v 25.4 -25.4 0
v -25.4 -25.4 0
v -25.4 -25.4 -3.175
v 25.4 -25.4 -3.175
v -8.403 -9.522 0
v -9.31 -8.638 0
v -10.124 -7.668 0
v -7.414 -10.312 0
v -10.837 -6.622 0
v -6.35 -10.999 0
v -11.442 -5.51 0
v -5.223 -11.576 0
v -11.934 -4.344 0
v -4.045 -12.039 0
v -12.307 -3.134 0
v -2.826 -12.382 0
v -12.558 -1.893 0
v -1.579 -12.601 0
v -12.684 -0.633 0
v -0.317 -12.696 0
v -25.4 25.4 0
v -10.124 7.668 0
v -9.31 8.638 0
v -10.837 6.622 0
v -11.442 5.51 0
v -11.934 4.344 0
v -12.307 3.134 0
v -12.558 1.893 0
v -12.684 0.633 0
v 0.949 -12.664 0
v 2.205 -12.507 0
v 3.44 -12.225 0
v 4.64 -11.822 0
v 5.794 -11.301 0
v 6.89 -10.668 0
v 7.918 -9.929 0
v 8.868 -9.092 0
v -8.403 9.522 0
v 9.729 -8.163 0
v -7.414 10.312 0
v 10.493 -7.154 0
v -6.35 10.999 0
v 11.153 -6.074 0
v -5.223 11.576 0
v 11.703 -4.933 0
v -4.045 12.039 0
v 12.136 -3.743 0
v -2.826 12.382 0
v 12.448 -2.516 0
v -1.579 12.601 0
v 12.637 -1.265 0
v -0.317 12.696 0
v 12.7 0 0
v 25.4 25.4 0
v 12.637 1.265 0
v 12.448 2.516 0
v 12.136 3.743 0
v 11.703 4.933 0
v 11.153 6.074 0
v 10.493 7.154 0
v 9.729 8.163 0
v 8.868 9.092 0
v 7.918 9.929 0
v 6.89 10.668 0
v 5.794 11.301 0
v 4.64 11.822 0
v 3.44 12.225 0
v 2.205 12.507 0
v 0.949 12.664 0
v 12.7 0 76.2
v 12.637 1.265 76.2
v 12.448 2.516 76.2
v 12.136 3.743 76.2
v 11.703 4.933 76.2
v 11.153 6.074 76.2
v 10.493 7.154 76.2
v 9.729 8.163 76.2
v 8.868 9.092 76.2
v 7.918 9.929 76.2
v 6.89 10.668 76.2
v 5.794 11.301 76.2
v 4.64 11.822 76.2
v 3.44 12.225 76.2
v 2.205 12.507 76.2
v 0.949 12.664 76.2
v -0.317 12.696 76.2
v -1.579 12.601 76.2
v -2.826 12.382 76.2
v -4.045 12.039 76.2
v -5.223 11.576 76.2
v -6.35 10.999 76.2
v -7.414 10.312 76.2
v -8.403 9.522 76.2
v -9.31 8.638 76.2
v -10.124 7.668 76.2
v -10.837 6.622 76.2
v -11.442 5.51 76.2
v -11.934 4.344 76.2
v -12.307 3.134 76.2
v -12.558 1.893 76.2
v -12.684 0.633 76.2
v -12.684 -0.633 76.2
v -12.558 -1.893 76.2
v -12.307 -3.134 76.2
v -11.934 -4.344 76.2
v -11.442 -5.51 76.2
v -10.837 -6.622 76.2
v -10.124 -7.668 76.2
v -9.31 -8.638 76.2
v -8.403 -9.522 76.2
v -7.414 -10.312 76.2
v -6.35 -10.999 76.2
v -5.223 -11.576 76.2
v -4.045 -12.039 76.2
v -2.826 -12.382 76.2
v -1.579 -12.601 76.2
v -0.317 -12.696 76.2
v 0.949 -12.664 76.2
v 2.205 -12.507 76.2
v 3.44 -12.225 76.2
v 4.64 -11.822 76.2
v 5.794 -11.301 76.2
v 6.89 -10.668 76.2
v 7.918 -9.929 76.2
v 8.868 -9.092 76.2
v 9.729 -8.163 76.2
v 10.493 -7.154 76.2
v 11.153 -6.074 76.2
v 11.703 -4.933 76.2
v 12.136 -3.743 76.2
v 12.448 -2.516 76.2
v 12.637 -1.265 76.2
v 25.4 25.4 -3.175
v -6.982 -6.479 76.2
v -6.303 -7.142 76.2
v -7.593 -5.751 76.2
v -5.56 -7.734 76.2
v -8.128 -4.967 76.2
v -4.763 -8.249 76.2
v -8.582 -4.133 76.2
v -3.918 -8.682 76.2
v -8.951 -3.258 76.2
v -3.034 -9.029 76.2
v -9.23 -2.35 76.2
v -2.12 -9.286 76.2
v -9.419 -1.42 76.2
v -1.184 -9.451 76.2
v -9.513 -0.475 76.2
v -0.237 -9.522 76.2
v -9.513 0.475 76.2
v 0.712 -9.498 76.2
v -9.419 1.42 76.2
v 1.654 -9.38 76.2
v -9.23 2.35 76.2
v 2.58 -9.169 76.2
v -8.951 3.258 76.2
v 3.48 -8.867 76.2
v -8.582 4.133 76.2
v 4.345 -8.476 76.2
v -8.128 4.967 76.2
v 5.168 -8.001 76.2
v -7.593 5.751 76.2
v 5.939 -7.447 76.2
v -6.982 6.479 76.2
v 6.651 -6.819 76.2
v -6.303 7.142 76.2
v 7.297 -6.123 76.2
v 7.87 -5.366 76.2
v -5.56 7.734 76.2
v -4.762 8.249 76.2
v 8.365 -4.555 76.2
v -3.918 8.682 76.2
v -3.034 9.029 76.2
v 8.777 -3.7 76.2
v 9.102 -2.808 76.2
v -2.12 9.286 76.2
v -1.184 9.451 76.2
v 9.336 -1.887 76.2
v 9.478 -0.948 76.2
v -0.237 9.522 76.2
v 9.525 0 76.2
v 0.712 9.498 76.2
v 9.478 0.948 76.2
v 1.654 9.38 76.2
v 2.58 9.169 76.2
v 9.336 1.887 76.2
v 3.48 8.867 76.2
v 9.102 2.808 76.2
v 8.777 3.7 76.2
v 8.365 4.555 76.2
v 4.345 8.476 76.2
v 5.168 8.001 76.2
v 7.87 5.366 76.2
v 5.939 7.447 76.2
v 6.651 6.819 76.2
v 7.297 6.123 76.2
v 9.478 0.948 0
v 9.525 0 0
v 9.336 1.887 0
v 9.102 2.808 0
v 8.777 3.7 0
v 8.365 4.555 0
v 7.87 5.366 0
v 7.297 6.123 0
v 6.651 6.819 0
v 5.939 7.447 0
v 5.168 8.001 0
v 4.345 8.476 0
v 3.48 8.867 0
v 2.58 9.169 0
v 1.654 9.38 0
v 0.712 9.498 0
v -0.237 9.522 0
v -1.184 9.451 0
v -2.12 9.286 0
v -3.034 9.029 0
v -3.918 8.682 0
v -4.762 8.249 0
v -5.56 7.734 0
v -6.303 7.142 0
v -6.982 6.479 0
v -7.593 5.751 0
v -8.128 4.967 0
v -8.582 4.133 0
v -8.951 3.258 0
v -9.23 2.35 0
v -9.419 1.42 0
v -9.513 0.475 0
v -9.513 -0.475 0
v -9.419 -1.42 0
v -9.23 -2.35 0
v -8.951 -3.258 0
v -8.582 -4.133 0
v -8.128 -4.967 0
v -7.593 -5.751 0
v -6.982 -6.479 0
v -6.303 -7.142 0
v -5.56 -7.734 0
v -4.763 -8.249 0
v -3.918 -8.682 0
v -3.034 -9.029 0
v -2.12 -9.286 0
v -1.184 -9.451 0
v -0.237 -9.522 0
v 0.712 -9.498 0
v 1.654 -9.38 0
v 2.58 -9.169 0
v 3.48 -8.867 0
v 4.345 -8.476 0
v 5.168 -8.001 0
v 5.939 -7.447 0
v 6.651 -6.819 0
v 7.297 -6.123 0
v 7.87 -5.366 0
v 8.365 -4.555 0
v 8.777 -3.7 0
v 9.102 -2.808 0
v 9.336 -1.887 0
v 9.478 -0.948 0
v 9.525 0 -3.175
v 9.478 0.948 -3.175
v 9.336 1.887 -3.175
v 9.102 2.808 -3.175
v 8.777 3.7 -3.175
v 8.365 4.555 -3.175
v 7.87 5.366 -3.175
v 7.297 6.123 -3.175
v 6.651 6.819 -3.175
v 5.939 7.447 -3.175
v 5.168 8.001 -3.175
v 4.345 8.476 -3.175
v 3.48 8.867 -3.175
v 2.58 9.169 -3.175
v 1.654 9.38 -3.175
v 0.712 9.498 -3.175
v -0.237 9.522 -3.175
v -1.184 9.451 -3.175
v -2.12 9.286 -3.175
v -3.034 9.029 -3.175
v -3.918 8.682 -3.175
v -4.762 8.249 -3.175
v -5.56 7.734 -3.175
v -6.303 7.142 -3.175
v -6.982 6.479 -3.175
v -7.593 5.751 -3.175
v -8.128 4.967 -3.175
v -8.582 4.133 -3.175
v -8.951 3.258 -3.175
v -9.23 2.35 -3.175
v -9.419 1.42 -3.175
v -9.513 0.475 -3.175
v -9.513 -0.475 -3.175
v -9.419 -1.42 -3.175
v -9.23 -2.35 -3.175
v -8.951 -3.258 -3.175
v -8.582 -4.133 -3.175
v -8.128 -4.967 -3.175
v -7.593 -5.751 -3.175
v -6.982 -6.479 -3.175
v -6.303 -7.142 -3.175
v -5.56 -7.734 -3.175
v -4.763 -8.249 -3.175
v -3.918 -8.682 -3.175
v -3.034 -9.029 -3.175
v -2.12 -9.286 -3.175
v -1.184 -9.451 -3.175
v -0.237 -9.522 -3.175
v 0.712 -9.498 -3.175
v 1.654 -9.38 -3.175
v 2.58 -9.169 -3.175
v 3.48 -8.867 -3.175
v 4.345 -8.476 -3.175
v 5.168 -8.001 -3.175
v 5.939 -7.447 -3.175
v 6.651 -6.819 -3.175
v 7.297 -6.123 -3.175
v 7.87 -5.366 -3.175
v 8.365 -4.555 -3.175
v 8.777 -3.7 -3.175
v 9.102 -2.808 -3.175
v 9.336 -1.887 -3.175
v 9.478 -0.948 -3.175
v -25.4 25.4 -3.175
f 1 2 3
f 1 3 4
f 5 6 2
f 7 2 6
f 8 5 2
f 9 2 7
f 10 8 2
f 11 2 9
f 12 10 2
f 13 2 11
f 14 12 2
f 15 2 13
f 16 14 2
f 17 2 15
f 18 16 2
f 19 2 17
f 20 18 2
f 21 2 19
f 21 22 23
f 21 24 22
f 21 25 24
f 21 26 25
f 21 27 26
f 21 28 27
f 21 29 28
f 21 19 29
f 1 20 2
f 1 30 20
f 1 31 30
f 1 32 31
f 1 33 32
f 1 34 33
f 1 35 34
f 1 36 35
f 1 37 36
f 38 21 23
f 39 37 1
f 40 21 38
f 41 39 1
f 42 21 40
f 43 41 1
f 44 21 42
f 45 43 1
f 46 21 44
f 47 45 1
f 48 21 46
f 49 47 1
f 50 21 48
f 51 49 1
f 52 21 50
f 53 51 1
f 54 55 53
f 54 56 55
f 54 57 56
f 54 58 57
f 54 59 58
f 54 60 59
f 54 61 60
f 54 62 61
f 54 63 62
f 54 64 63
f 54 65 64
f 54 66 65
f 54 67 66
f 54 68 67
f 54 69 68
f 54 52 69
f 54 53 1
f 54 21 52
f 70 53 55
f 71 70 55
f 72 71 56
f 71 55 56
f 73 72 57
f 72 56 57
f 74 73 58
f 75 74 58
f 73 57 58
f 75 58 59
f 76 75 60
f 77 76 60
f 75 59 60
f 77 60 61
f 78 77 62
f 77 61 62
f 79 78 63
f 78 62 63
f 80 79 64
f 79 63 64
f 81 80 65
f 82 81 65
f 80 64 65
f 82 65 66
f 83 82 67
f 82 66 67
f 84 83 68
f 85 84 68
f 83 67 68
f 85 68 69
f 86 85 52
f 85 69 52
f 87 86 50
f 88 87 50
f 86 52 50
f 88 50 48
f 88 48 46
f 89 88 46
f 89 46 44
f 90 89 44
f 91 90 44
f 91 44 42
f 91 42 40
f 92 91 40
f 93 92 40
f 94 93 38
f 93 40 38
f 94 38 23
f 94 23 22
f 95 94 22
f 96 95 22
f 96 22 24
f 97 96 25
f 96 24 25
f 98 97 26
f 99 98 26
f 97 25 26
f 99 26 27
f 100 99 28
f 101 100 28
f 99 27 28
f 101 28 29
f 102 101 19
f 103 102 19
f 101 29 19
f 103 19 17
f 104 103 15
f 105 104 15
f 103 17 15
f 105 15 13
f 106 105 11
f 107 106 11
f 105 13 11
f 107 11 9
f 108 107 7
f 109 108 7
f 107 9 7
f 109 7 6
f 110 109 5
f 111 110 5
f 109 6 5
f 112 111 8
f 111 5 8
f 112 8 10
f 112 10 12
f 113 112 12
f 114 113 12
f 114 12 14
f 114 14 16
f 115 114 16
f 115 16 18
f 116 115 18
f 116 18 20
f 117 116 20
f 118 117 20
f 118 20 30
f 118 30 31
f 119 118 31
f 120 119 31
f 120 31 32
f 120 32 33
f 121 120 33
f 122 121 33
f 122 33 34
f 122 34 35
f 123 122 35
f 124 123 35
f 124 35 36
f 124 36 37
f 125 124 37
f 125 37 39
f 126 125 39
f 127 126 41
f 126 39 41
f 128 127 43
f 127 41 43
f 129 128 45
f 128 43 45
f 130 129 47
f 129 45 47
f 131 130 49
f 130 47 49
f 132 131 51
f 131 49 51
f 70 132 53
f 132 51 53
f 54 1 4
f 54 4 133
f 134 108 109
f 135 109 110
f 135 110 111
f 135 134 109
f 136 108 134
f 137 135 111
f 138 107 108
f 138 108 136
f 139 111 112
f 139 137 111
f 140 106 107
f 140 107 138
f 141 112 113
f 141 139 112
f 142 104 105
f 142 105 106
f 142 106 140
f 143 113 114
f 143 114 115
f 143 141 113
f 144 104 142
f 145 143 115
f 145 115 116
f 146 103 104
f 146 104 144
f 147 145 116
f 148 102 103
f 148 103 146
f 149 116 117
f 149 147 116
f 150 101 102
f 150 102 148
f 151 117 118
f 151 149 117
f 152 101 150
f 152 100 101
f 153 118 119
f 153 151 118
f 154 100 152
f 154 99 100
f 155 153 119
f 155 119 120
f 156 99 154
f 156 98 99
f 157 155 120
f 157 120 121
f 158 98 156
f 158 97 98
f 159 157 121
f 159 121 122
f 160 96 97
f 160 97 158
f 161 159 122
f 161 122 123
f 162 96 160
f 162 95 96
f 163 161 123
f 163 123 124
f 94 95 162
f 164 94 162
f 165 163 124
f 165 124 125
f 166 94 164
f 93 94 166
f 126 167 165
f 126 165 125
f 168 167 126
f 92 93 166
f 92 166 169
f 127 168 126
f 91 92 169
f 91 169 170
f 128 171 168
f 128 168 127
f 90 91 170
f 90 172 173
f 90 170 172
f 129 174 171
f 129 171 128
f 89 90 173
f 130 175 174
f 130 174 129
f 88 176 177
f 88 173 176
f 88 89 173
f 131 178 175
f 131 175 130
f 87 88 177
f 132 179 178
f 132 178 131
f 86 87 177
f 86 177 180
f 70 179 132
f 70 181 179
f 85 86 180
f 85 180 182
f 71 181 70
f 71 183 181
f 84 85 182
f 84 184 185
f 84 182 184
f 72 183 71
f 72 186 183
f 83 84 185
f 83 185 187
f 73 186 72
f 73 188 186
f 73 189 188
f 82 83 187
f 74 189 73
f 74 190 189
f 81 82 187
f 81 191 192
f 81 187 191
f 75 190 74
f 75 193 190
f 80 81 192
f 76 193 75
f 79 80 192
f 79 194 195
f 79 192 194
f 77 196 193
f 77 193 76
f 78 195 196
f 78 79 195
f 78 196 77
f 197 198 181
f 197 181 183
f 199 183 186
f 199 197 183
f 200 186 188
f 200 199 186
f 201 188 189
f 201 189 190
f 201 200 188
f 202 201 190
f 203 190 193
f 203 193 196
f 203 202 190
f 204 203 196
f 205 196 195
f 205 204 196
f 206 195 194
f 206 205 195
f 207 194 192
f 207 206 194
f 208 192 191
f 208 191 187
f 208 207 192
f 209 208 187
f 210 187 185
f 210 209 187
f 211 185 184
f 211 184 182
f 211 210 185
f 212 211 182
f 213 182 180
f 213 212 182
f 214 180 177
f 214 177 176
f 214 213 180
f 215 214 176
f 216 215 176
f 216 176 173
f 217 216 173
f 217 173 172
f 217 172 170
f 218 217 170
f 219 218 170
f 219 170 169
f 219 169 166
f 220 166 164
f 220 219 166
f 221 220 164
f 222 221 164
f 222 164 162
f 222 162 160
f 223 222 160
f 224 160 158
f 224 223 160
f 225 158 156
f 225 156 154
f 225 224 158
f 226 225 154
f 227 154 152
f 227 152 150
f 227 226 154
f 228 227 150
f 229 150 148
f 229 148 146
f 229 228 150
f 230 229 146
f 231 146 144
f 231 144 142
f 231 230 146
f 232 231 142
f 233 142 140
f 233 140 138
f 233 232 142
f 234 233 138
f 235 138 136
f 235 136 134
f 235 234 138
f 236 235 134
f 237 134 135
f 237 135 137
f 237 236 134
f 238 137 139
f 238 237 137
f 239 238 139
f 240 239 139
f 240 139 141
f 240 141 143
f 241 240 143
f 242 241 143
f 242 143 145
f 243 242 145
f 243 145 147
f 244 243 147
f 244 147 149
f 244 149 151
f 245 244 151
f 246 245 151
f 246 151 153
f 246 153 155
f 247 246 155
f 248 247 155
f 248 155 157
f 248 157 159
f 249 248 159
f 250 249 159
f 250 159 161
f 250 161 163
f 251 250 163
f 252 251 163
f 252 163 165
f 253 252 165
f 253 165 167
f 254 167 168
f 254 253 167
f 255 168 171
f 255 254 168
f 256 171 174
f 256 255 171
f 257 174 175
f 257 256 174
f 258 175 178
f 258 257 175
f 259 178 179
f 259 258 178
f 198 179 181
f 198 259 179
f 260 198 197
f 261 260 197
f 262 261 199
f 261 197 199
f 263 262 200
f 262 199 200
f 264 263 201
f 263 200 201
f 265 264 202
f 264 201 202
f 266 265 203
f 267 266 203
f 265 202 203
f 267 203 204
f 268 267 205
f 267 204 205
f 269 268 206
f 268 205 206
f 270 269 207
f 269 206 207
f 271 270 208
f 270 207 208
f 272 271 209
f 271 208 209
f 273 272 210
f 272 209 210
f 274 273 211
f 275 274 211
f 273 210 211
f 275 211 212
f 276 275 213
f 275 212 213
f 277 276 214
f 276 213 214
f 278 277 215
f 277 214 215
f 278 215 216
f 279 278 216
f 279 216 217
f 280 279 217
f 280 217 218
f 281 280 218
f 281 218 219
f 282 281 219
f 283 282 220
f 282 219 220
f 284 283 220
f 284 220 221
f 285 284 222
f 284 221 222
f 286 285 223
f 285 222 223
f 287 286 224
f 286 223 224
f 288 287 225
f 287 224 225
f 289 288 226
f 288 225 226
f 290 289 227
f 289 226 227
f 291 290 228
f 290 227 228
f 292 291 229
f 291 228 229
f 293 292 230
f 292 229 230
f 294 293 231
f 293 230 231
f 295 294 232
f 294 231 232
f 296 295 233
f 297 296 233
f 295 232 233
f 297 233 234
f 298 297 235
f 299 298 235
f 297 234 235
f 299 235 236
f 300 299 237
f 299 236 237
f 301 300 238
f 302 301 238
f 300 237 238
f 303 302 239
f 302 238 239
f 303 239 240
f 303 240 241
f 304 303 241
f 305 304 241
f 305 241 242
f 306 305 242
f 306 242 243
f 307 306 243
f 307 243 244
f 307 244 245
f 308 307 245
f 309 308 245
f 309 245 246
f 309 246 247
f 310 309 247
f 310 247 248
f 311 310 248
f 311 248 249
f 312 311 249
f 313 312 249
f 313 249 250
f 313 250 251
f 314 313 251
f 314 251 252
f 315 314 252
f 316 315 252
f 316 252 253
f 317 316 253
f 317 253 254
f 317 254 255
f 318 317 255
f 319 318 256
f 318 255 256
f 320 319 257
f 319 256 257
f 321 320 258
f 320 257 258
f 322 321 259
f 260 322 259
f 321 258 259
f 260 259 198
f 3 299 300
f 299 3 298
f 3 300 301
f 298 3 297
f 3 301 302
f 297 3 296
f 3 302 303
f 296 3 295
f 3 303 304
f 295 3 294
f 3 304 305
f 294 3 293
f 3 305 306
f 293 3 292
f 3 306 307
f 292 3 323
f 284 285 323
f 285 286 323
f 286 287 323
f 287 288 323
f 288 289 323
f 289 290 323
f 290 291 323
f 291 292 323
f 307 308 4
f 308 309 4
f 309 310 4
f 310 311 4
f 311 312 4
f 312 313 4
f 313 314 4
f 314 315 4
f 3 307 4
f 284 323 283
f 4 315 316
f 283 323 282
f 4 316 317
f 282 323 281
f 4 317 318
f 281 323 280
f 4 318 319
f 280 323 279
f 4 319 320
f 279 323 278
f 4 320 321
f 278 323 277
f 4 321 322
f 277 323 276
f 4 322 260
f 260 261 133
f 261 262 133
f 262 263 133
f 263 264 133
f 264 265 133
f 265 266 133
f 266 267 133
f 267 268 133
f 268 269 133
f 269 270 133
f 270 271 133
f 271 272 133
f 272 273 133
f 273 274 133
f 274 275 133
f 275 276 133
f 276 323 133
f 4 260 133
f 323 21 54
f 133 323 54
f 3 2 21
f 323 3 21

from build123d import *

# Parameters (mm, degrees)
F0_R     = 12.7
F0_R_2   = 9.525
F1_DEPTH = 76.2
F2_W     = 50.8
F2_H     = 50.8
F2_R     = 9.525
F3_DEPTH = 3.175


with BuildPart() as f1:
    # F0 (on Top) → F1 (new body)
    with BuildSketch(Plane.XY):
        Circle(F0_R)
        Circle(F0_R_2, mode=Mode.SUBTRACT)
    extrude(amount=F1_DEPTH)

    # F2 (on Top) → F3 (join)
    with BuildSketch(Plane.XY):
        Rectangle(F2_W, F2_H)
        Circle(F2_R, mode=Mode.SUBTRACT)
    extrude(amount=-F3_DEPTH)


solid = f1.part
